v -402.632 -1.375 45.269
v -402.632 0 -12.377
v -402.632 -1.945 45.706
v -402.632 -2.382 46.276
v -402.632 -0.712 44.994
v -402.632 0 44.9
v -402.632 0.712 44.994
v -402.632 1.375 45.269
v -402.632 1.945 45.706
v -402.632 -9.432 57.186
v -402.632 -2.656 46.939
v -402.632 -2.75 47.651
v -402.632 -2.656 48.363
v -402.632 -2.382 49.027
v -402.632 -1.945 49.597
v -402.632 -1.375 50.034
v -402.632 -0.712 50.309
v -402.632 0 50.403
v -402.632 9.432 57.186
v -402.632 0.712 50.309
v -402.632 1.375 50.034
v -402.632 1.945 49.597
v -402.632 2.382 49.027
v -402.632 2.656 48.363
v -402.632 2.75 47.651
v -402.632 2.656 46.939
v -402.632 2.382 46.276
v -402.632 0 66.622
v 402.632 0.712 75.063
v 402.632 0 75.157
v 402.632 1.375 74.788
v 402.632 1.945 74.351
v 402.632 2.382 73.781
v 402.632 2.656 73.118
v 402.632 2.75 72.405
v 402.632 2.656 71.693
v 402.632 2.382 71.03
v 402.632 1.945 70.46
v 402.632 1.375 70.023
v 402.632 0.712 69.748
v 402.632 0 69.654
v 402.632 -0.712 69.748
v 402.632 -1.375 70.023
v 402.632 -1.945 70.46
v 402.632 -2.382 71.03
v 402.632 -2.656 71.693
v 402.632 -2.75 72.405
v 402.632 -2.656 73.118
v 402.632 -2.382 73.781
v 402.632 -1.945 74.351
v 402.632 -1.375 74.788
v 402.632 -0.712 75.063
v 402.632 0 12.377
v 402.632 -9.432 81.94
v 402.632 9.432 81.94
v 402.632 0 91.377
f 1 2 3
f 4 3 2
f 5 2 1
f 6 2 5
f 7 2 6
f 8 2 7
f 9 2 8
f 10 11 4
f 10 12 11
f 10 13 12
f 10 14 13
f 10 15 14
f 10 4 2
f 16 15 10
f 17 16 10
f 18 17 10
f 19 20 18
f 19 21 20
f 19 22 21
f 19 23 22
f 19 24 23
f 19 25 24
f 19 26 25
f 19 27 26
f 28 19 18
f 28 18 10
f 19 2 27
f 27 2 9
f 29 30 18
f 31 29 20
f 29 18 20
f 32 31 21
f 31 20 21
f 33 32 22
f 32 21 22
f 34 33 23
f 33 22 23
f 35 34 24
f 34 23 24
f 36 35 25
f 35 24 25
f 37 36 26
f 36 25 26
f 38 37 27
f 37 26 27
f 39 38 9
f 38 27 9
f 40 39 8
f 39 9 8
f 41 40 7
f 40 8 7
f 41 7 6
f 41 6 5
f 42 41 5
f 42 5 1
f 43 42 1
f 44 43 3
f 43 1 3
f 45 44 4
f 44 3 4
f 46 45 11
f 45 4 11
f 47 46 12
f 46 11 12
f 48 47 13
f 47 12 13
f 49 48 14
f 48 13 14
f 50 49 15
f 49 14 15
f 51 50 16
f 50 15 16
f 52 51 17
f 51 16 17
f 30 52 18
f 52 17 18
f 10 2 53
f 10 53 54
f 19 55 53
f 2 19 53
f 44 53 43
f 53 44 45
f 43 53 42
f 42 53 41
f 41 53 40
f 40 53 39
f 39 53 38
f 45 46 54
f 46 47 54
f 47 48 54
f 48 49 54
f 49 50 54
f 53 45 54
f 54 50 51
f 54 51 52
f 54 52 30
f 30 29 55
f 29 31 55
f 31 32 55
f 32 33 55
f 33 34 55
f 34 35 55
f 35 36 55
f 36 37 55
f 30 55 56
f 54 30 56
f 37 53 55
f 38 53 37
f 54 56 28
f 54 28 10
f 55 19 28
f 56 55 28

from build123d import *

# Parameters (mm, degrees)
AILERON_DEPTH           = 402.822020631
SKETCH2_R               = 2.75
CUT_EXTRUDE2_DEPTH      = 403.822020631
CUT_EXTRUDE2_DEPTH_BACK = 406.280098


with BuildPart() as part:
    # aileron_root → aileron (new body, symmetric, along a direction that is not the sketch's normal)
    with BuildSketch(Plane(origin=(0, 0, 0), x_dir=(0, 0, -1), z_dir=(1, 0, 0))):
        Polygon((-80, -10.846932253), (-80, 10.846932253), (0, 0), align=None)
    extrude(amount=AILERON_DEPTH, dir=(0.999527846, 0, 0.030725967), both=True)

    # Sketch2 → Cut-Extrude2 (cut, two sides)
    with BuildSketch(Plane(origin=(0, 0, 0), x_dir=(-0.030725967, 0, 0.999527846), z_dir=(-0.999527846, 0, -0.030725967))) as cut_extrude2_sk:
        with Locations((60, 0)):
            Circle(SKETCH2_R)
        Polygon((78.962227681, 0), (68.115295428, -10.846932253), (79.962227681, -10.846932253), (79.962227681, 10.846932253), (68.115295428, 10.846932253), align=None)
    extrude(amount=CUT_EXTRUDE2_DEPTH, mode=Mode.SUBTRACT)
    extrude(cut_extrude2_sk.sketch, amount=-CUT_EXTRUDE2_DEPTH_BACK, mode=Mode.SUBTRACT)


solid = part.part
